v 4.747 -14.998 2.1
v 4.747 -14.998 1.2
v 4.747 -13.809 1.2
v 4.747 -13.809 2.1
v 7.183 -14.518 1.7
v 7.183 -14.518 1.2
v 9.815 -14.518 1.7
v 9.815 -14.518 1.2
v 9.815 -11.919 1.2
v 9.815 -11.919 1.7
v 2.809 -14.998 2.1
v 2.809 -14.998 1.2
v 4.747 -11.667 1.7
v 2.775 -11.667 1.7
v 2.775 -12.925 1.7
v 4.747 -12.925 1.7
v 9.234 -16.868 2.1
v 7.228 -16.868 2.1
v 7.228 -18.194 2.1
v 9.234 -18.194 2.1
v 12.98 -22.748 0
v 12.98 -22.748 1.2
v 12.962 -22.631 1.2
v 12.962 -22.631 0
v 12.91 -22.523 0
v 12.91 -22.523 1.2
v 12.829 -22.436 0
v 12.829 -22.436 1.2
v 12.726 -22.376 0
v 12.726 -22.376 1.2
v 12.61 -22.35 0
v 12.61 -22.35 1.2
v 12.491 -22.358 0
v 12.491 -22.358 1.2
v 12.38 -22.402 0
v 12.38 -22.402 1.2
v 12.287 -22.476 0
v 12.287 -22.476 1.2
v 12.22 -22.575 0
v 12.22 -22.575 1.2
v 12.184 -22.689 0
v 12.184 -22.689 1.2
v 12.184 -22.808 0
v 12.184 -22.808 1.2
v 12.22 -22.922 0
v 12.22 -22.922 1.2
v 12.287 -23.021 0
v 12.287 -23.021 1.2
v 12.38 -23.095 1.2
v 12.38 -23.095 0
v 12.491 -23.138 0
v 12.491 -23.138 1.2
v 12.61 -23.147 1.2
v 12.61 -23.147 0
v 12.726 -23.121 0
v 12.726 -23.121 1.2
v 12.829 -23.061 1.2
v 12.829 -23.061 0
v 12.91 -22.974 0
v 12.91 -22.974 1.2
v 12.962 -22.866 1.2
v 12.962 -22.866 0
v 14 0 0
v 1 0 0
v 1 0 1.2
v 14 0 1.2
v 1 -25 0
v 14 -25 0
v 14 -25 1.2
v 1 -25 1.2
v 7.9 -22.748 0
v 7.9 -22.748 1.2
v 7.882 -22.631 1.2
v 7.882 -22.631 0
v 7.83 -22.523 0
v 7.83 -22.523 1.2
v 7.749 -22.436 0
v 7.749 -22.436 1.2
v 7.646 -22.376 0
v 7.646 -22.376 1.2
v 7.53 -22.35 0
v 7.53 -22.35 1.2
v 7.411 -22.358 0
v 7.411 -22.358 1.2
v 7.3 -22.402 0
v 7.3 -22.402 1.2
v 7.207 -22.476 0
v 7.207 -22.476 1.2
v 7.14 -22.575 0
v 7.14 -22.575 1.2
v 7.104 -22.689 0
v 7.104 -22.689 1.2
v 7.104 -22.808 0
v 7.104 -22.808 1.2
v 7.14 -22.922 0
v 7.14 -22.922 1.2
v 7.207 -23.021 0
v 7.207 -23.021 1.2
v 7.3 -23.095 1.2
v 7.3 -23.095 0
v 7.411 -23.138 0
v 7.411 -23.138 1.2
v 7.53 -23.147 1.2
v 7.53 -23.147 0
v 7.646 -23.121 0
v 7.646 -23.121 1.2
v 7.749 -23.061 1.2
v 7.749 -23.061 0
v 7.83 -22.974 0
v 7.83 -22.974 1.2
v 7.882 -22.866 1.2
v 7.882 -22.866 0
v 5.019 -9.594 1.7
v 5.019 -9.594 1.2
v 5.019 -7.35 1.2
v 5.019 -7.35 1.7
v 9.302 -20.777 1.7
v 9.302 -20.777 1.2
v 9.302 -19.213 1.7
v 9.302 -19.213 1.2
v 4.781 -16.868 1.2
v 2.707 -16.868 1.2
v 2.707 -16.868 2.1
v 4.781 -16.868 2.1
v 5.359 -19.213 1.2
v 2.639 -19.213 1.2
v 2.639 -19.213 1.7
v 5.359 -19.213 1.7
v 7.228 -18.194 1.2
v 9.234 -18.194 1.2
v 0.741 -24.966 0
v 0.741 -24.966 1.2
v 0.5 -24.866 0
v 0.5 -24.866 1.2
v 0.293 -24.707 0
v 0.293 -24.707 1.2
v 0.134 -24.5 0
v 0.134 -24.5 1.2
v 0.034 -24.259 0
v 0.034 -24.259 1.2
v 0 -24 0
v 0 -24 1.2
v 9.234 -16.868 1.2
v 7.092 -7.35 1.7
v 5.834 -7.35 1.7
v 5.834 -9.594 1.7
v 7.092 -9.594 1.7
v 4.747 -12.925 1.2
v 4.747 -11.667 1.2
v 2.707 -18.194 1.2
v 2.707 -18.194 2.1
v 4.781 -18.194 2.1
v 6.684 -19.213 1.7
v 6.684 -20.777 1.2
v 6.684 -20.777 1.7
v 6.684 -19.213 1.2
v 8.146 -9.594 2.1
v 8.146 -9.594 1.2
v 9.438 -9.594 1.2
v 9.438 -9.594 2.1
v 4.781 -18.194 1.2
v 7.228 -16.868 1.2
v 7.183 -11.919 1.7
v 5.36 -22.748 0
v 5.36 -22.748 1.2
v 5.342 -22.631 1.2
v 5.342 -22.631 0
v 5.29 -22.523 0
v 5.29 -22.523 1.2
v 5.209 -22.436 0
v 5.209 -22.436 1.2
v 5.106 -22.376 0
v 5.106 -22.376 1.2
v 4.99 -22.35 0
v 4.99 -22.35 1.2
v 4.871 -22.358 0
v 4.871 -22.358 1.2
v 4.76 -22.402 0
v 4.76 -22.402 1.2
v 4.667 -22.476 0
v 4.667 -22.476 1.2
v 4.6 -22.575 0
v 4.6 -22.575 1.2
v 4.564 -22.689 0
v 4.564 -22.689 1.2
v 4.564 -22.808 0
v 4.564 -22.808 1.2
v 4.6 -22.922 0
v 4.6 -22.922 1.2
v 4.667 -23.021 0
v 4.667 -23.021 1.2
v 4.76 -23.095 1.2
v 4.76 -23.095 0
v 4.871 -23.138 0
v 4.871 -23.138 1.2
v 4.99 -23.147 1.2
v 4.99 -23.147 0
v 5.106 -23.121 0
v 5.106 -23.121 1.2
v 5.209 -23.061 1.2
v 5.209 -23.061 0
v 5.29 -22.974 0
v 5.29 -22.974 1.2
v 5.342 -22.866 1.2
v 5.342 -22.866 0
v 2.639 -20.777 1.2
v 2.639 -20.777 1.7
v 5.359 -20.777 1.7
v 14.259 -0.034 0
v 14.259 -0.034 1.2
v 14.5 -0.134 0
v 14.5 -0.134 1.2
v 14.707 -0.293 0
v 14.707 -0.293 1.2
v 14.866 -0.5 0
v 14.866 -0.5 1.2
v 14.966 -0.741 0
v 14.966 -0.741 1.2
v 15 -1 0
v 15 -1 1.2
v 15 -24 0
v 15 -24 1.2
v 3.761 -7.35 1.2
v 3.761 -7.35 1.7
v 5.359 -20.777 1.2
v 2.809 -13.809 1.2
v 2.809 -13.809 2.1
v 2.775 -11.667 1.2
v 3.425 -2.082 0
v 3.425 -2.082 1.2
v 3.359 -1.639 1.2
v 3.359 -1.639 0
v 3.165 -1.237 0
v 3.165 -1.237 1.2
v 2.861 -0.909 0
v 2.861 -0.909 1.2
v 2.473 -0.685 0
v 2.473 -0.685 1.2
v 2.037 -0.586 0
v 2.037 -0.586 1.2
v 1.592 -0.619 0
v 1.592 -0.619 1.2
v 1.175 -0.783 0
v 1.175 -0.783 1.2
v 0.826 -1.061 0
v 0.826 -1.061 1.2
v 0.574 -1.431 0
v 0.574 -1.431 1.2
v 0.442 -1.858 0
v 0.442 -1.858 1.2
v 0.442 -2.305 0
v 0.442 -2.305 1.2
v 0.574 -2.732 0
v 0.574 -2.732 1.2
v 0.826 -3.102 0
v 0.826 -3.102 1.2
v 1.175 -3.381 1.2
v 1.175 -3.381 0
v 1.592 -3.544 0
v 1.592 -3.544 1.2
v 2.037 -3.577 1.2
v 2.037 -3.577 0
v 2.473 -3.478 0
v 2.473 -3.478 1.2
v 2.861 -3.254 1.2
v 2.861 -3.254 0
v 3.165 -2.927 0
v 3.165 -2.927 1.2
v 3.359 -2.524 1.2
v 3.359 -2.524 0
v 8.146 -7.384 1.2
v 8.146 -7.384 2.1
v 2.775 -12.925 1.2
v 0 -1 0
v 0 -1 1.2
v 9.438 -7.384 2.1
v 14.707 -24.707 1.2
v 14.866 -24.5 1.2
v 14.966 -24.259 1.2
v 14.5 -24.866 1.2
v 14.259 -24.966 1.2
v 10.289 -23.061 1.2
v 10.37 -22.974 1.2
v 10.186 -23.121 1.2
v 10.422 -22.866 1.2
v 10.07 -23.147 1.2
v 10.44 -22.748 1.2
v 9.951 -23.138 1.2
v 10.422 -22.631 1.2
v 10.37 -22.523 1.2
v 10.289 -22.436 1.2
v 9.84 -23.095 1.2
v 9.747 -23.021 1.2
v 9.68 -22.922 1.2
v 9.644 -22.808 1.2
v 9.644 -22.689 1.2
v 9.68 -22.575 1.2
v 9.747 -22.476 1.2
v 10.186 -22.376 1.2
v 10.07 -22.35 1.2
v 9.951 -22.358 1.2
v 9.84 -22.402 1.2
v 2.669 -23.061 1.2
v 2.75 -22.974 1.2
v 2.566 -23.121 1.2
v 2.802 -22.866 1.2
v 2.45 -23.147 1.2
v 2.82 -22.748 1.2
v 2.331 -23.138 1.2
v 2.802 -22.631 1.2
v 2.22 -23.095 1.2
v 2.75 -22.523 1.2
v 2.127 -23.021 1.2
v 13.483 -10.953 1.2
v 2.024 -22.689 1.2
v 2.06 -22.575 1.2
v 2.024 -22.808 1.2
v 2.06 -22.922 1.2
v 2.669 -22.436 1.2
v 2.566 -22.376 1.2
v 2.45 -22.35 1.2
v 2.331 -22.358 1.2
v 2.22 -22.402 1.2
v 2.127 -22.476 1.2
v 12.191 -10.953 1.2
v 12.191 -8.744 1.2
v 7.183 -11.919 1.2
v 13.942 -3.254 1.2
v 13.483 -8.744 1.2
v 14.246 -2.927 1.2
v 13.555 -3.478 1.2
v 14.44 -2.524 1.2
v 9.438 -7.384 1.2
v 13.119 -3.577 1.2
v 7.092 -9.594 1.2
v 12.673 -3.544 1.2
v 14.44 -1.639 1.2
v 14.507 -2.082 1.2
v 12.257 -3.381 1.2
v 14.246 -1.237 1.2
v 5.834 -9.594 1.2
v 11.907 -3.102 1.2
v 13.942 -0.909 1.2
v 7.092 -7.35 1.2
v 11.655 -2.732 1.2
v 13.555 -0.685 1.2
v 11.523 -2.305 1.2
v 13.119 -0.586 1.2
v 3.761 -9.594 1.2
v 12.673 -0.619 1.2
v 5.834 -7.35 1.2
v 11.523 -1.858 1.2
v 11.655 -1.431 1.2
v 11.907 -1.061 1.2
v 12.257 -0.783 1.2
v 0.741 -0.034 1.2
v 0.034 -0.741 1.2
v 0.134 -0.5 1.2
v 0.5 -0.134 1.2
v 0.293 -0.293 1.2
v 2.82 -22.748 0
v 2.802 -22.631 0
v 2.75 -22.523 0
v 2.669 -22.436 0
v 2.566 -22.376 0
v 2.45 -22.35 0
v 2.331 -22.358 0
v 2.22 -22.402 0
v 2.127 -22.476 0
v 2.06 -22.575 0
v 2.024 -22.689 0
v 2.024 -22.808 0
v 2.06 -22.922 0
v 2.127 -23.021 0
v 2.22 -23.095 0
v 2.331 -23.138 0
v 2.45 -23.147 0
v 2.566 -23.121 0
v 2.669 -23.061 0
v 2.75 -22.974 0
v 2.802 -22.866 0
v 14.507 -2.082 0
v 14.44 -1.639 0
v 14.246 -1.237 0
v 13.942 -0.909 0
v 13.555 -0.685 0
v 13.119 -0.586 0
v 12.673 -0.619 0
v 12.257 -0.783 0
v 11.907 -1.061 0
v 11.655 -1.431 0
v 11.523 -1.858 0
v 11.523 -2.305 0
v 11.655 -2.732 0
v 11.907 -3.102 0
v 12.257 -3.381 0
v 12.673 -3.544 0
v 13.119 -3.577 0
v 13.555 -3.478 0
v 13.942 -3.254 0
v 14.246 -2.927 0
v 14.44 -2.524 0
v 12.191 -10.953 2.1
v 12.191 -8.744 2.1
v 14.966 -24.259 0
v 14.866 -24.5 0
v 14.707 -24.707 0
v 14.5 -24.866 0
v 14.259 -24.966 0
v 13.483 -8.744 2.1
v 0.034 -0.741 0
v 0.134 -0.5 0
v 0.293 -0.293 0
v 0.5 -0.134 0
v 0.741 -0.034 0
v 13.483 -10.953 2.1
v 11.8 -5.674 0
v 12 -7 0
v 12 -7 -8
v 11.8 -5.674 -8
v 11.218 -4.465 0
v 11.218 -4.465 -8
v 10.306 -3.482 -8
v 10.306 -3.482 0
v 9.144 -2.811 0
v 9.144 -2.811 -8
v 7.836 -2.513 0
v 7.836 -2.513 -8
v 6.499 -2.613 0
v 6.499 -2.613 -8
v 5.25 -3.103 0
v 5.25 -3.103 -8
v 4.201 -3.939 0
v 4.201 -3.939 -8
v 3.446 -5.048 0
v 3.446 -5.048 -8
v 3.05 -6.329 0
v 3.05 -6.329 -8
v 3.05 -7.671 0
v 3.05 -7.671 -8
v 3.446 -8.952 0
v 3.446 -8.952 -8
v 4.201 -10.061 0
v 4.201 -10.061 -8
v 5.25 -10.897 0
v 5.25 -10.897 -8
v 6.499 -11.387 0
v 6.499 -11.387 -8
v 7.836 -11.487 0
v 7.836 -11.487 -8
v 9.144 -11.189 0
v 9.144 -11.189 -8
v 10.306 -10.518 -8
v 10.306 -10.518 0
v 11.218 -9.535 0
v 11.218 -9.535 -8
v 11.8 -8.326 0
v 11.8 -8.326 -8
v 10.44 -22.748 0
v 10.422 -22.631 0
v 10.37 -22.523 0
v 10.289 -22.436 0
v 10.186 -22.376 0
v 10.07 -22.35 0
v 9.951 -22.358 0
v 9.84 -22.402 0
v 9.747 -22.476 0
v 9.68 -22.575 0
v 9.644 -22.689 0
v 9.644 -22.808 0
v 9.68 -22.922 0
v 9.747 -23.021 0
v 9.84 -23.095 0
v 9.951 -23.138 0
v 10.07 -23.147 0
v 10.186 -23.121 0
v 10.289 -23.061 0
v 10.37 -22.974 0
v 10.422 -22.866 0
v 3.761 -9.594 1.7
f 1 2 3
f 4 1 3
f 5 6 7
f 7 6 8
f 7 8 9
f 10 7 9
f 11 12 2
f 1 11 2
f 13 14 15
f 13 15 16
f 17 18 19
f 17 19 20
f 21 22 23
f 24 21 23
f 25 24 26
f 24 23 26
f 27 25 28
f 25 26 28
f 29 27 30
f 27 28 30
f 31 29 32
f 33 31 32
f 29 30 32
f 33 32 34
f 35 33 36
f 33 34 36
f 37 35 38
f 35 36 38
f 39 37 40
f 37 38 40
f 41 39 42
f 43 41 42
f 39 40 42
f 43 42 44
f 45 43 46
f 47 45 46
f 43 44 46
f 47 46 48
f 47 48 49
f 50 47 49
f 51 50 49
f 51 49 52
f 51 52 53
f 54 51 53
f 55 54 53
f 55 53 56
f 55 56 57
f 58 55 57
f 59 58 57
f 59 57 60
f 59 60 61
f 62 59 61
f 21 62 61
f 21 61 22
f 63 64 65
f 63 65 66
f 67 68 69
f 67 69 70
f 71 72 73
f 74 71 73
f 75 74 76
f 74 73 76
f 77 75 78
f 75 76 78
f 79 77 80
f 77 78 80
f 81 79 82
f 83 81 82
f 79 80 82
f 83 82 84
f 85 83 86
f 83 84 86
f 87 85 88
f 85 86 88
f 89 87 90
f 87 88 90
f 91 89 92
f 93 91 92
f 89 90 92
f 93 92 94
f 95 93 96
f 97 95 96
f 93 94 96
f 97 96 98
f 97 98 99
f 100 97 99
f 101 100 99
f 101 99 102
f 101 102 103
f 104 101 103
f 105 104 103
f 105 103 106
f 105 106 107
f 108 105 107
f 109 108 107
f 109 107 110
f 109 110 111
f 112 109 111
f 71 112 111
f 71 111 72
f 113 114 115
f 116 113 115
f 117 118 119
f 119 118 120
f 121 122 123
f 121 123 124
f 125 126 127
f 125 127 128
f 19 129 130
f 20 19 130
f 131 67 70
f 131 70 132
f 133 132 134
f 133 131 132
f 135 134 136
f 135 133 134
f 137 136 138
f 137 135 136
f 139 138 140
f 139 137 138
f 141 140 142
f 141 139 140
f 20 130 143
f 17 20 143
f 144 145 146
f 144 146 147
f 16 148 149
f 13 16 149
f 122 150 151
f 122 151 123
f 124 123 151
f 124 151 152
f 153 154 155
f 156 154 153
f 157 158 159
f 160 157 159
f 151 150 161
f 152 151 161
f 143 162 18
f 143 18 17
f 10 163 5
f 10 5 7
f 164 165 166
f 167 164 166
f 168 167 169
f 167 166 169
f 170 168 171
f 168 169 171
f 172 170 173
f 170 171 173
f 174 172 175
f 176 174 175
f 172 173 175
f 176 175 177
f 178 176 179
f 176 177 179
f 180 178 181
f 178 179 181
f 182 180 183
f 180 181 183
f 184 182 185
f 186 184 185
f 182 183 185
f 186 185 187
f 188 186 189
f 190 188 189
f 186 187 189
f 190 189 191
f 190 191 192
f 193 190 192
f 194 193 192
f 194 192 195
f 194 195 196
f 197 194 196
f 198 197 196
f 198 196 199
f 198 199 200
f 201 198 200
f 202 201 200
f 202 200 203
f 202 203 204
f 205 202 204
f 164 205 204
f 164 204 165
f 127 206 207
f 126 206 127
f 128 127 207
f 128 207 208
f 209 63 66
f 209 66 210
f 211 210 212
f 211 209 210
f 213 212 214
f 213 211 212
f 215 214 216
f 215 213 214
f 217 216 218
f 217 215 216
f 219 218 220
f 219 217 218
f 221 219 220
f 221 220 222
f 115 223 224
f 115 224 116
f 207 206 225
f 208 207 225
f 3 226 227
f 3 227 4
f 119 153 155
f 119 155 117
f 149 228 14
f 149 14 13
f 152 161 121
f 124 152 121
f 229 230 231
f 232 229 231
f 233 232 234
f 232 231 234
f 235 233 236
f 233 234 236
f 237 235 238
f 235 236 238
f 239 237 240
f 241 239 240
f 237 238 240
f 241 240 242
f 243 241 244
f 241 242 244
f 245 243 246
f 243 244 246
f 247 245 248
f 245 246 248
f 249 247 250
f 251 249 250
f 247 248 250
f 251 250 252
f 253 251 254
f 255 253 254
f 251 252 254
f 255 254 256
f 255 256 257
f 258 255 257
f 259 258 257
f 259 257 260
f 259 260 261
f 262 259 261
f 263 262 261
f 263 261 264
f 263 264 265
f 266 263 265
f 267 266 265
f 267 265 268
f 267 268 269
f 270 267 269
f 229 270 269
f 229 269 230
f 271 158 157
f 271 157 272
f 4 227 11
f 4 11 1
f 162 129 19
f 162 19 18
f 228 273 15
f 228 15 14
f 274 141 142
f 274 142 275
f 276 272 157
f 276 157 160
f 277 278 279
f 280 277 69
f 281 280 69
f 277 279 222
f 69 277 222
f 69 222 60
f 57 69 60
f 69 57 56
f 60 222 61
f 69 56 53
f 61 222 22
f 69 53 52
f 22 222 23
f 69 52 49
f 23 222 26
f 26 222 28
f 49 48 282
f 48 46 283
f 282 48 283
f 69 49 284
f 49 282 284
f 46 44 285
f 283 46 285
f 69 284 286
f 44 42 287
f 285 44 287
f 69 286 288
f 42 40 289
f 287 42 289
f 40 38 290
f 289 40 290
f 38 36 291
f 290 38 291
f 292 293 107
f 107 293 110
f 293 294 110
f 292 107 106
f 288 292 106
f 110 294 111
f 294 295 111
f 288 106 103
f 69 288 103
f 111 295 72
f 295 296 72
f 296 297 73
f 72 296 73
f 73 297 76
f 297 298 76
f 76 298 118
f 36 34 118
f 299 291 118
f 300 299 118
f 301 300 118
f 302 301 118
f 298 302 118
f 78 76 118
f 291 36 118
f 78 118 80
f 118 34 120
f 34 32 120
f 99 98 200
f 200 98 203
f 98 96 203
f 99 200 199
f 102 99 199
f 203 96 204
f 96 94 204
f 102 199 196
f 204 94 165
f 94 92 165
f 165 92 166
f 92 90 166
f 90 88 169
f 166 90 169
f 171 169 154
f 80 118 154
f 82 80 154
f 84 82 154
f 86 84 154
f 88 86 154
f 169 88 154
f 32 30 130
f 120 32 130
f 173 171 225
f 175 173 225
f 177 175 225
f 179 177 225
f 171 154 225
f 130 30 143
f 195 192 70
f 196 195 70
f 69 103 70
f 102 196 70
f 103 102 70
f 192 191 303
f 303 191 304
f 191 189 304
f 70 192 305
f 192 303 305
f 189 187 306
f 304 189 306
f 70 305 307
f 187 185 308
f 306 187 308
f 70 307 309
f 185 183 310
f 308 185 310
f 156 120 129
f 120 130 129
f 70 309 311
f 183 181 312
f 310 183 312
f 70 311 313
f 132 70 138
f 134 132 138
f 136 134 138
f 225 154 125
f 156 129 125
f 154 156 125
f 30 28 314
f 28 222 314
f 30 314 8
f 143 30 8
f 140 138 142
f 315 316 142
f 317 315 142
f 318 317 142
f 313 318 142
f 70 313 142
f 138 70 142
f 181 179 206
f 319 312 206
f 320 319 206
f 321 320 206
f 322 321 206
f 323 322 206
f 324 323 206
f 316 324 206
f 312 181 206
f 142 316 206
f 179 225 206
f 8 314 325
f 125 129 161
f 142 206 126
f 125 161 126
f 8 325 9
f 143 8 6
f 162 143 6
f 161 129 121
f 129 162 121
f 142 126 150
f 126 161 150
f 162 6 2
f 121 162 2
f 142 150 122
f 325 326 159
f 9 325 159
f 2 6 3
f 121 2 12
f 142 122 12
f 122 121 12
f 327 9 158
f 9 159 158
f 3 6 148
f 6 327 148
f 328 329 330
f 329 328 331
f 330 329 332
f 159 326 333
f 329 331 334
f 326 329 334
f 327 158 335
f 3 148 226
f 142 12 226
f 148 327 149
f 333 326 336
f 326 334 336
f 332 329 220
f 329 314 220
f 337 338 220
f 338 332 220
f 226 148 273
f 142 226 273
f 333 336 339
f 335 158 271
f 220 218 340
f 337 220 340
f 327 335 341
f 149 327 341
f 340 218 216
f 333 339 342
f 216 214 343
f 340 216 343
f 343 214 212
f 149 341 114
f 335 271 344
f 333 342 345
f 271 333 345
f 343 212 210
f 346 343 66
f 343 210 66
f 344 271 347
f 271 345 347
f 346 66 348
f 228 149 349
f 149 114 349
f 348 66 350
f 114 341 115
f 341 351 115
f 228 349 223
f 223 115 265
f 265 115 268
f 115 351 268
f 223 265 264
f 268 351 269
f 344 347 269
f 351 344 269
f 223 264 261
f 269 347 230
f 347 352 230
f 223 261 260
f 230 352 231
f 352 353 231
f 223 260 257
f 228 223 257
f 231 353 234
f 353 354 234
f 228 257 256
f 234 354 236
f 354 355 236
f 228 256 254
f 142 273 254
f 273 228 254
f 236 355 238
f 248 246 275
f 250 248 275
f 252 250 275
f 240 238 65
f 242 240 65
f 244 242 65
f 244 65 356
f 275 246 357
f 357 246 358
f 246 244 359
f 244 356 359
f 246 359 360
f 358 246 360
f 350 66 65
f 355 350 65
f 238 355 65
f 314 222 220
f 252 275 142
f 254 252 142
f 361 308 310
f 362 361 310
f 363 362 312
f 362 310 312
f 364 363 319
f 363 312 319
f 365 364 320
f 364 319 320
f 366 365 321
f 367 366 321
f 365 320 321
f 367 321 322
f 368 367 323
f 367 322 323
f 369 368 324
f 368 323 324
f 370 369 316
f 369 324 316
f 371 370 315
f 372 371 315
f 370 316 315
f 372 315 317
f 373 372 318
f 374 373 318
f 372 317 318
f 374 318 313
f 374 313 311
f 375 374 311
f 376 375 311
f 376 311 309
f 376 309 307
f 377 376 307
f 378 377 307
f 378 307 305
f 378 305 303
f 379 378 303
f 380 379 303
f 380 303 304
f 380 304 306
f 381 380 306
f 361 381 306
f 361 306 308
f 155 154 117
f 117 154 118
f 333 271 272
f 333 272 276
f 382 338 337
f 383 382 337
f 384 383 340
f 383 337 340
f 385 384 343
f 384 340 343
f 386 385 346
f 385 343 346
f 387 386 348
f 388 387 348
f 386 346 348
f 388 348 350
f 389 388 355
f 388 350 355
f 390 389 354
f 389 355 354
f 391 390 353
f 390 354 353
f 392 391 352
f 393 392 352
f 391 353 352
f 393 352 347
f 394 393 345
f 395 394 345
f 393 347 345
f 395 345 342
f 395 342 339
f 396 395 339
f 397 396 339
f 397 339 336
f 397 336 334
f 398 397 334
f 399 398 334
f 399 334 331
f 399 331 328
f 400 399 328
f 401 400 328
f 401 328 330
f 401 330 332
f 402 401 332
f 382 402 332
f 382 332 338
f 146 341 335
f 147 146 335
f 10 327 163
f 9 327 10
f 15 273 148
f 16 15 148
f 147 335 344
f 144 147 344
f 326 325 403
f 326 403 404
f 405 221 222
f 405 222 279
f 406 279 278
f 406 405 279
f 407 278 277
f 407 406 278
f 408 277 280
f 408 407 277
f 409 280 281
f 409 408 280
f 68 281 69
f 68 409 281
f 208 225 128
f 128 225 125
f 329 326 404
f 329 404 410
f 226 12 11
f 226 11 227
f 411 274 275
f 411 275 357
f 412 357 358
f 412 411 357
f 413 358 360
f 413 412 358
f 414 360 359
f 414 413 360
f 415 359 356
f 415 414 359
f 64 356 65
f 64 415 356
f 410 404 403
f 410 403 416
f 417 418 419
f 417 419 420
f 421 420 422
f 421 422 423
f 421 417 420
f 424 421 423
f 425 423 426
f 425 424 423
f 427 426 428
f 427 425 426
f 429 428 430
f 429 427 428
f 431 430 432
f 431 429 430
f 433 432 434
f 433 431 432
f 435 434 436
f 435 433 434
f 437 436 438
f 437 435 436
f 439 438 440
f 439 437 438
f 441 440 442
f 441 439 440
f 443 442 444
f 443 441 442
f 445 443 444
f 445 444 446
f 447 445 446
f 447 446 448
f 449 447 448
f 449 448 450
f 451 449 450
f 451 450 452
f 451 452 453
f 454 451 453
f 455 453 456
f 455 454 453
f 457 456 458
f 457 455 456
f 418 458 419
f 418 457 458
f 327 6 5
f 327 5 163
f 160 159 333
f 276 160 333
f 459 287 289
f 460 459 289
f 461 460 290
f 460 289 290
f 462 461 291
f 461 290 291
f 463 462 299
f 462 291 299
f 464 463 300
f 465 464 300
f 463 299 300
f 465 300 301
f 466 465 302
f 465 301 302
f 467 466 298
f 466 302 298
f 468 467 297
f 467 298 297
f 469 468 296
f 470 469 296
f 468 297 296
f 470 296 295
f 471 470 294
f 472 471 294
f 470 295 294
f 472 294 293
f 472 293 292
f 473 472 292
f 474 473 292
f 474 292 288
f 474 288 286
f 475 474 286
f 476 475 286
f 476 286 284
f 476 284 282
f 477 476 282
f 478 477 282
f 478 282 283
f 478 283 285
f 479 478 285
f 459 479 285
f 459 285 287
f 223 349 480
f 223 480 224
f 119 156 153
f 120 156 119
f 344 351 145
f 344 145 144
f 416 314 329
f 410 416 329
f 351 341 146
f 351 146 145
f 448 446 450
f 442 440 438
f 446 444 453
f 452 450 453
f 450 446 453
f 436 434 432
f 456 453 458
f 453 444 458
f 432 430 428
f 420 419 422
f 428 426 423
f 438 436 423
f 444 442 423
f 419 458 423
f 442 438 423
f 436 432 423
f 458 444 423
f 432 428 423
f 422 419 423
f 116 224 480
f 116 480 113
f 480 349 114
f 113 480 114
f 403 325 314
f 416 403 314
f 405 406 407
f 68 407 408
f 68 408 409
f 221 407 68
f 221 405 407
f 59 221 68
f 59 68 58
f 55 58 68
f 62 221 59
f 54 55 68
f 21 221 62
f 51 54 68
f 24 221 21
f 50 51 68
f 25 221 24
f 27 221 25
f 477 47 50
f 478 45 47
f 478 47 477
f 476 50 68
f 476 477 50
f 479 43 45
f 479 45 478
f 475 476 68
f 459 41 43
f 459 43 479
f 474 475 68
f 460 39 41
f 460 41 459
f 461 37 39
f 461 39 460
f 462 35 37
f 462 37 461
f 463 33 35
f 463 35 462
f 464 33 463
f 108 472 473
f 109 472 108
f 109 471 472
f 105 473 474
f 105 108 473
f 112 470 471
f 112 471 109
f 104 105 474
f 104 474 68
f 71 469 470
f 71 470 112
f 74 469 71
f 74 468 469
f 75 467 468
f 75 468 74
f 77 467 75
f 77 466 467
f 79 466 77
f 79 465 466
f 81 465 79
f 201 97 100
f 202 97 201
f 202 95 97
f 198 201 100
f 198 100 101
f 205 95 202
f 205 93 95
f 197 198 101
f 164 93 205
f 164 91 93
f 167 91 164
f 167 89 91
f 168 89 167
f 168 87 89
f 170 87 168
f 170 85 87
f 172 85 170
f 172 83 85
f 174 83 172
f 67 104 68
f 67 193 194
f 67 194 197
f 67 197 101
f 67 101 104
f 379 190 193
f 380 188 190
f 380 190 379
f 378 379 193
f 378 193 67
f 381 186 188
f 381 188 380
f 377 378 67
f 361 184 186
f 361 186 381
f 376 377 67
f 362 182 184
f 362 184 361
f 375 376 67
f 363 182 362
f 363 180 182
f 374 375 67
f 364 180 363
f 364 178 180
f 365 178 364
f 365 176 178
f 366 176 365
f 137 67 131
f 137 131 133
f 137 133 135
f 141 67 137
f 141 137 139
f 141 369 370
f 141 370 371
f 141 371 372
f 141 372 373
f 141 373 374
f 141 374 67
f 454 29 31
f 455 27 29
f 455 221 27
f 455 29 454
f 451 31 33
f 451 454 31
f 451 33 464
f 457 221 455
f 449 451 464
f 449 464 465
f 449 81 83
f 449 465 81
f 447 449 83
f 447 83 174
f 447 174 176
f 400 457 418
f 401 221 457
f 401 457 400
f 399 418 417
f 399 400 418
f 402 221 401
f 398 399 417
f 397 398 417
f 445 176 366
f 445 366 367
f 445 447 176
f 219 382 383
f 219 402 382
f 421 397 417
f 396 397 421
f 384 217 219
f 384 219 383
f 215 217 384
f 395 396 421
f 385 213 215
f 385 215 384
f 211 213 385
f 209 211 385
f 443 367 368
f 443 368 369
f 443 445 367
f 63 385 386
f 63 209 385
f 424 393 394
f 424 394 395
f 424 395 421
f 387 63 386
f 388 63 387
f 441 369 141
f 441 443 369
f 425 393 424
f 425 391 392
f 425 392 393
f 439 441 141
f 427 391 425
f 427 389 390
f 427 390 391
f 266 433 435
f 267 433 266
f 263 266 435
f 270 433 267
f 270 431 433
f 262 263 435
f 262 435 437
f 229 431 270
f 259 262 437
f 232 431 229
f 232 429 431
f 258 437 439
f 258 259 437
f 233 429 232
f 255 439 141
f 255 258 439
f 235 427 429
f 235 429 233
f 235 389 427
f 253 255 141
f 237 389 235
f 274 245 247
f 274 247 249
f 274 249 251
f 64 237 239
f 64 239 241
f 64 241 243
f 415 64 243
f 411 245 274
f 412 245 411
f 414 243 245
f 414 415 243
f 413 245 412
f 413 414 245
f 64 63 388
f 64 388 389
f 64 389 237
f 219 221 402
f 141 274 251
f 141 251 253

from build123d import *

# Parameters (mm, degrees)
BOSS_EXTRUDE1_DEPTH                  = 1.2
SKETCH2_R                            = 4.5
BOSS_EXTRUDE2_DEPTH                  = 8
F_3_0MM_DOWEL_HOLE1_D                = 3
F_3_0MM_DOWEL_HOLE1_DEPTH            = 2
F_3_0MM_DOWEL_HOLE1_TIP              = 0.901290929
F_97_0_03149606_DIAMETER_HOLE1_D     = 0.799999924
F_97_0_03149606_DIAMETER_HOLE1_DEPTH = 2
F_97_0_03149606_DIAMETER_HOLE1_TIP   = 0.240344225
SKETCH17_W                           = 2.632057762
SKETCH17_H                           = 2.598740575
BOSS_EXTRUDE5_DEPTH                  = 0.5
SKETCH18_W                           = 2.719328156
SKETCH18_H                           = 1.56361369
SKETCH18_W_2                         = 2.61735335
BOSS_EXTRUDE6_DEPTH                  = 0.5
SKETCH19_W                           = 2.073487719
SKETCH19_H                           = 1.325672476
SKETCH19_W_2                         = 2.005504515
BOSS_EXTRUDE7_DEPTH                  = 0.9
SKETCH20_W                           = 1.971512913
SKETCH20_H                           = 1.257689272
SKETCH20_W_2                         = 1.257689272
SKETCH20_H_2                         = 2.243445728
SKETCH20_W_3                         = 1.257689273
BOSS_EXTRUDE8_DEPTH                  = 0.5
SKETCH21_W                           = 1.937521311
SKETCH21_H                           = 1.189706068
SKETCH21_W_2                         = 1.291680874
SKETCH21_H_2                         = 2.209454126
BOSS_EXTRUDE9_DEPTH                  = 0.9


with BuildPart() as part:
    # Sketch1 → Boss-Extrude1 (new body)
    with BuildSketch(Plane.XY):
        with BuildLine():
            Line((1, 0), (14, 0))
            ThreePointArc((14, 0), (14.707106781, -0.292893219), (15, -1))
            Line((15, -1), (15, -24))
            ThreePointArc((15, -24), (14.707106781, -24.707106781), (14, -25))
            Line((14, -25), (1, -25))
            ThreePointArc((1, -25), (0.292893219, -24.707106781), (0, -24))
            Line((0, -24), (0, -1))
            ThreePointArc((0, -1), (0.292893219, -0.292893219), (1, 0))
        make_face()
    extrude(amount=BOSS_EXTRUDE1_DEPTH)

    # Sketch2 → Boss-Extrude2 (add)
    with BuildSketch(Plane.XY):
        with Locations((7.5, -7)):
            Circle(SKETCH2_R)
    extrude(amount=-BOSS_EXTRUDE2_DEPTH)

    # Ø3.0mm Dowel Hole1
    with Locations(Plane(origin=(0, 0, 0), x_dir=(-1, 0, 0), z_dir=(0, 0, -1))):
        with Locations((-13.006639516, -2.081574002), (-1.92537728, -2.081574002)):
            Hole(F_3_0MM_DOWEL_HOLE1_D / 2, depth=F_3_0MM_DOWEL_HOLE1_DEPTH)
            with Locations((0, 0, -(F_3_0MM_DOWEL_HOLE1_DEPTH + F_3_0MM_DOWEL_HOLE1_TIP / 2))):  # 118° drill point
                Cone(0, F_3_0MM_DOWEL_HOLE1_D / 2, F_3_0MM_DOWEL_HOLE1_TIP, mode=Mode.SUBTRACT)

    # #97 (0.03149606) Diameter Hole1
    with Locations(Plane(origin=(0, 0, 0), x_dir=(-1, 0, 0), z_dir=(0, 0, -1))):
        with Locations((-7.5, -22.748467988), (-10.04, -22.748467988), (-12.58, -22.748467988), (-4.96, -22.748467988), (-2.42, -22.748467988)):
            Hole(F_97_0_03149606_DIAMETER_HOLE1_D / 2, depth=F_97_0_03149606_DIAMETER_HOLE1_DEPTH)
            with Locations((0, 0, -(F_97_0_03149606_DIAMETER_HOLE1_DEPTH + F_97_0_03149606_DIAMETER_HOLE1_TIP / 2))):  # 118° drill point
                Cone(0, F_97_0_03149606_DIAMETER_HOLE1_D / 2, F_97_0_03149606_DIAMETER_HOLE1_TIP, mode=Mode.SUBTRACT)

    # Sketch17 → Boss-Extrude5 (add)
    with BuildSketch(Plane.XY.offset(1.2)):
        with Locations((8.499275401, -13.218640589)):
            Rectangle(SKETCH17_W, SKETCH17_H)
    extrude(amount=BOSS_EXTRUDE5_DEPTH)

    # Sketch18 → Boss-Extrude6 (add)
    with BuildSketch(Plane.XY.offset(1.2)):
        with Locations((3.998864999, -19.99514823)):
            Rectangle(SKETCH18_W, SKETCH18_H)
        with Locations((7.992878228, -19.99514823)):
            Rectangle(SKETCH18_W_2, SKETCH18_H)
    extrude(amount=BOSS_EXTRUDE6_DEPTH)

    # Sketch19 → Boss-Extrude7 (add)
    with BuildSketch(Plane.XY.offset(1.2)):
        with Locations((3.743927985, -17.530757089)):
            Rectangle(SKETCH19_W, SKETCH19_H)
        with Locations((8.230819441, -17.530757089)):
            Rectangle(SKETCH19_W_2, SKETCH19_H)
    extrude(amount=BOSS_EXTRUDE7_DEPTH)

    # Sketch20 → Boss-Extrude8 (add)
    with BuildSketch(Plane.XY.offset(1.2)):
        with Locations((3.760923786, -12.296050388)):
            Rectangle(SKETCH20_W, SKETCH20_H)
        with Locations((4.389768422, -8.471995169)):
            Rectangle(SKETCH20_W_2, SKETCH20_H_2)
        with Locations((6.463256141, -8.471995169)):
            Rectangle(SKETCH20_W_3, SKETCH20_H_2)
    extrude(amount=BOSS_EXTRUDE8_DEPTH)

    # Sketch21 → Boss-Extrude9 (add)
    with BuildSketch(Plane.XY.offset(1.2)):
        with Locations((3.777919587, -14.403529709)):
            Rectangle(SKETCH21_W, SKETCH21_H)
        with Locations((8.791680874, -8.48899097)):
            Rectangle(SKETCH21_W_2, SKETCH21_H_2)
        with Locations((12.836681506, -9.848655048)):
            Rectangle(SKETCH21_W_2, SKETCH21_H_2)
    extrude(amount=BOSS_EXTRUDE9_DEPTH)


solid = part.part
